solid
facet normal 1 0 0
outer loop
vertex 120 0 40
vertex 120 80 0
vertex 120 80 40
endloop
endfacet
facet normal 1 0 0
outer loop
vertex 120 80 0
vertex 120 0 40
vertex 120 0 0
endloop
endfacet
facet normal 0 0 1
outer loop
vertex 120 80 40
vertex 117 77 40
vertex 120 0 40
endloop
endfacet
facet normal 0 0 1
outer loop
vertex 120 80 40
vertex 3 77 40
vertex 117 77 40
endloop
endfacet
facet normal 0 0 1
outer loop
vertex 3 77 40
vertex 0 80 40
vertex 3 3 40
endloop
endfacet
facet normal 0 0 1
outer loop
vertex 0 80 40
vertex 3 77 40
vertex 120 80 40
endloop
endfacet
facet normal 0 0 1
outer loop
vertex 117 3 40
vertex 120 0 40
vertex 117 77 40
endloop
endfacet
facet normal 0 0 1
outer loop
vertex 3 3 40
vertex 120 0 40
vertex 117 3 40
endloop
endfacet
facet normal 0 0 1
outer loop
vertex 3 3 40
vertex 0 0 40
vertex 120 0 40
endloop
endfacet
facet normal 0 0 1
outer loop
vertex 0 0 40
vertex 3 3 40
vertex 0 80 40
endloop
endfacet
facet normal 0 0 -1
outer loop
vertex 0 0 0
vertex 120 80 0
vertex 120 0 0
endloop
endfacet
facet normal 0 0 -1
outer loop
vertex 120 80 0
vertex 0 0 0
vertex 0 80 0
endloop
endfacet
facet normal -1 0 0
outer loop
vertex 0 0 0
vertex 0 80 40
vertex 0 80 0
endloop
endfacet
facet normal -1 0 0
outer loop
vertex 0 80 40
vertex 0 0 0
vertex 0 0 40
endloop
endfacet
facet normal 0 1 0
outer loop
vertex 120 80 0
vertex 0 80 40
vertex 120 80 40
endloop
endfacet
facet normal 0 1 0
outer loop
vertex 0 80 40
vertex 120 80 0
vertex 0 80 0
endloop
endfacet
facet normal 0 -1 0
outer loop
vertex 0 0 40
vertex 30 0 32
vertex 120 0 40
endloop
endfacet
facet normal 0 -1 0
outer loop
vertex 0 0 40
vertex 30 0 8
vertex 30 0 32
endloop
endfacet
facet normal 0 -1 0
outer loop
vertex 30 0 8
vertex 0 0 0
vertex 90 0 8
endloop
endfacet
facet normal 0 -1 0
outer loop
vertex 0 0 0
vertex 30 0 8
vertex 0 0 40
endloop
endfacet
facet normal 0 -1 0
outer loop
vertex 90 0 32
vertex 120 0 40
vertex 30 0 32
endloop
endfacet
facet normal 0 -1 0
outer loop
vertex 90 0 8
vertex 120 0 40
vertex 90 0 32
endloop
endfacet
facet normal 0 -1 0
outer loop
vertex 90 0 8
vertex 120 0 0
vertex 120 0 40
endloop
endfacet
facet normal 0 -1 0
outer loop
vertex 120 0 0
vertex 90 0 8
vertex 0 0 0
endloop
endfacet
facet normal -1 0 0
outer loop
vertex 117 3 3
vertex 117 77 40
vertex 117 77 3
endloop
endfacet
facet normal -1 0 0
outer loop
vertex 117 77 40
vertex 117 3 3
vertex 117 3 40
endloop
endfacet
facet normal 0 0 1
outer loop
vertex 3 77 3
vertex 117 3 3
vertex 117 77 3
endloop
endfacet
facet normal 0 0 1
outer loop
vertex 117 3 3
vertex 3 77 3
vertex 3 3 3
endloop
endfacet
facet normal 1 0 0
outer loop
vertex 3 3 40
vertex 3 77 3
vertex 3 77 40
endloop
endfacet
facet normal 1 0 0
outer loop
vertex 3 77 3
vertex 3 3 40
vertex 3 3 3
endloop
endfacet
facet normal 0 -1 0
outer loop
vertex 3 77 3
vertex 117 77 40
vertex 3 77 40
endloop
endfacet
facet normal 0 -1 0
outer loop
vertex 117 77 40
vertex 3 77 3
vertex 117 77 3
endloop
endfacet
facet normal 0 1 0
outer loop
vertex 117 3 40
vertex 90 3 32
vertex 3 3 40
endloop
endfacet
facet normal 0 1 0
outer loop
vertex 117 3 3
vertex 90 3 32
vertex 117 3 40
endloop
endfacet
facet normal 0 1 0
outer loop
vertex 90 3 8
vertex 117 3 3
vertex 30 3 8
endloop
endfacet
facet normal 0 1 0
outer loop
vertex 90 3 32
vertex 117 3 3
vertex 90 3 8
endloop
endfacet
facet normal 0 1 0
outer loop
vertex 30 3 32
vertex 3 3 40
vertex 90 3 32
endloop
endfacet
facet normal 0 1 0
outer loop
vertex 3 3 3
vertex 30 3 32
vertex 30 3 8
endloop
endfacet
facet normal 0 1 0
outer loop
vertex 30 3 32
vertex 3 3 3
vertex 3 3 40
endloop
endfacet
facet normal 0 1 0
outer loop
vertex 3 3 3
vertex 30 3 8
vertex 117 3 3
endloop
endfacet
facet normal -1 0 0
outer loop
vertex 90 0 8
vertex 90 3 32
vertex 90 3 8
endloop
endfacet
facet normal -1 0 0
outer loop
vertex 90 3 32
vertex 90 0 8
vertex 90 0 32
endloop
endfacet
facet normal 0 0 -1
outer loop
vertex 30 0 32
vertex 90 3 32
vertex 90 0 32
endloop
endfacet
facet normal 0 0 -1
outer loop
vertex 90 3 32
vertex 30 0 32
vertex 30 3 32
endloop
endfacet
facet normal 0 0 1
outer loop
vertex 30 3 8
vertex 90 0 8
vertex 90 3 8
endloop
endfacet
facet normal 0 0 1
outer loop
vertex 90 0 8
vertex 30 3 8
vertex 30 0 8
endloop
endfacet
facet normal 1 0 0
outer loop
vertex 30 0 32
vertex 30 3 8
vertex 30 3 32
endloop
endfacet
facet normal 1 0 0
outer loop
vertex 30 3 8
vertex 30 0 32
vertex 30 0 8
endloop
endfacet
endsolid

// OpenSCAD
// Enclosure: 120x80x40, wall 3, open top; 60x24 window through front wall (y=0..3).
difference() {
  difference() {
    cube([120,80,40]);
    translate([3,3,3]) cube([114,74,40]);   // open-top cavity
  }
  translate([30,-1,8]) cube([60,5,24]);     // front window
}
